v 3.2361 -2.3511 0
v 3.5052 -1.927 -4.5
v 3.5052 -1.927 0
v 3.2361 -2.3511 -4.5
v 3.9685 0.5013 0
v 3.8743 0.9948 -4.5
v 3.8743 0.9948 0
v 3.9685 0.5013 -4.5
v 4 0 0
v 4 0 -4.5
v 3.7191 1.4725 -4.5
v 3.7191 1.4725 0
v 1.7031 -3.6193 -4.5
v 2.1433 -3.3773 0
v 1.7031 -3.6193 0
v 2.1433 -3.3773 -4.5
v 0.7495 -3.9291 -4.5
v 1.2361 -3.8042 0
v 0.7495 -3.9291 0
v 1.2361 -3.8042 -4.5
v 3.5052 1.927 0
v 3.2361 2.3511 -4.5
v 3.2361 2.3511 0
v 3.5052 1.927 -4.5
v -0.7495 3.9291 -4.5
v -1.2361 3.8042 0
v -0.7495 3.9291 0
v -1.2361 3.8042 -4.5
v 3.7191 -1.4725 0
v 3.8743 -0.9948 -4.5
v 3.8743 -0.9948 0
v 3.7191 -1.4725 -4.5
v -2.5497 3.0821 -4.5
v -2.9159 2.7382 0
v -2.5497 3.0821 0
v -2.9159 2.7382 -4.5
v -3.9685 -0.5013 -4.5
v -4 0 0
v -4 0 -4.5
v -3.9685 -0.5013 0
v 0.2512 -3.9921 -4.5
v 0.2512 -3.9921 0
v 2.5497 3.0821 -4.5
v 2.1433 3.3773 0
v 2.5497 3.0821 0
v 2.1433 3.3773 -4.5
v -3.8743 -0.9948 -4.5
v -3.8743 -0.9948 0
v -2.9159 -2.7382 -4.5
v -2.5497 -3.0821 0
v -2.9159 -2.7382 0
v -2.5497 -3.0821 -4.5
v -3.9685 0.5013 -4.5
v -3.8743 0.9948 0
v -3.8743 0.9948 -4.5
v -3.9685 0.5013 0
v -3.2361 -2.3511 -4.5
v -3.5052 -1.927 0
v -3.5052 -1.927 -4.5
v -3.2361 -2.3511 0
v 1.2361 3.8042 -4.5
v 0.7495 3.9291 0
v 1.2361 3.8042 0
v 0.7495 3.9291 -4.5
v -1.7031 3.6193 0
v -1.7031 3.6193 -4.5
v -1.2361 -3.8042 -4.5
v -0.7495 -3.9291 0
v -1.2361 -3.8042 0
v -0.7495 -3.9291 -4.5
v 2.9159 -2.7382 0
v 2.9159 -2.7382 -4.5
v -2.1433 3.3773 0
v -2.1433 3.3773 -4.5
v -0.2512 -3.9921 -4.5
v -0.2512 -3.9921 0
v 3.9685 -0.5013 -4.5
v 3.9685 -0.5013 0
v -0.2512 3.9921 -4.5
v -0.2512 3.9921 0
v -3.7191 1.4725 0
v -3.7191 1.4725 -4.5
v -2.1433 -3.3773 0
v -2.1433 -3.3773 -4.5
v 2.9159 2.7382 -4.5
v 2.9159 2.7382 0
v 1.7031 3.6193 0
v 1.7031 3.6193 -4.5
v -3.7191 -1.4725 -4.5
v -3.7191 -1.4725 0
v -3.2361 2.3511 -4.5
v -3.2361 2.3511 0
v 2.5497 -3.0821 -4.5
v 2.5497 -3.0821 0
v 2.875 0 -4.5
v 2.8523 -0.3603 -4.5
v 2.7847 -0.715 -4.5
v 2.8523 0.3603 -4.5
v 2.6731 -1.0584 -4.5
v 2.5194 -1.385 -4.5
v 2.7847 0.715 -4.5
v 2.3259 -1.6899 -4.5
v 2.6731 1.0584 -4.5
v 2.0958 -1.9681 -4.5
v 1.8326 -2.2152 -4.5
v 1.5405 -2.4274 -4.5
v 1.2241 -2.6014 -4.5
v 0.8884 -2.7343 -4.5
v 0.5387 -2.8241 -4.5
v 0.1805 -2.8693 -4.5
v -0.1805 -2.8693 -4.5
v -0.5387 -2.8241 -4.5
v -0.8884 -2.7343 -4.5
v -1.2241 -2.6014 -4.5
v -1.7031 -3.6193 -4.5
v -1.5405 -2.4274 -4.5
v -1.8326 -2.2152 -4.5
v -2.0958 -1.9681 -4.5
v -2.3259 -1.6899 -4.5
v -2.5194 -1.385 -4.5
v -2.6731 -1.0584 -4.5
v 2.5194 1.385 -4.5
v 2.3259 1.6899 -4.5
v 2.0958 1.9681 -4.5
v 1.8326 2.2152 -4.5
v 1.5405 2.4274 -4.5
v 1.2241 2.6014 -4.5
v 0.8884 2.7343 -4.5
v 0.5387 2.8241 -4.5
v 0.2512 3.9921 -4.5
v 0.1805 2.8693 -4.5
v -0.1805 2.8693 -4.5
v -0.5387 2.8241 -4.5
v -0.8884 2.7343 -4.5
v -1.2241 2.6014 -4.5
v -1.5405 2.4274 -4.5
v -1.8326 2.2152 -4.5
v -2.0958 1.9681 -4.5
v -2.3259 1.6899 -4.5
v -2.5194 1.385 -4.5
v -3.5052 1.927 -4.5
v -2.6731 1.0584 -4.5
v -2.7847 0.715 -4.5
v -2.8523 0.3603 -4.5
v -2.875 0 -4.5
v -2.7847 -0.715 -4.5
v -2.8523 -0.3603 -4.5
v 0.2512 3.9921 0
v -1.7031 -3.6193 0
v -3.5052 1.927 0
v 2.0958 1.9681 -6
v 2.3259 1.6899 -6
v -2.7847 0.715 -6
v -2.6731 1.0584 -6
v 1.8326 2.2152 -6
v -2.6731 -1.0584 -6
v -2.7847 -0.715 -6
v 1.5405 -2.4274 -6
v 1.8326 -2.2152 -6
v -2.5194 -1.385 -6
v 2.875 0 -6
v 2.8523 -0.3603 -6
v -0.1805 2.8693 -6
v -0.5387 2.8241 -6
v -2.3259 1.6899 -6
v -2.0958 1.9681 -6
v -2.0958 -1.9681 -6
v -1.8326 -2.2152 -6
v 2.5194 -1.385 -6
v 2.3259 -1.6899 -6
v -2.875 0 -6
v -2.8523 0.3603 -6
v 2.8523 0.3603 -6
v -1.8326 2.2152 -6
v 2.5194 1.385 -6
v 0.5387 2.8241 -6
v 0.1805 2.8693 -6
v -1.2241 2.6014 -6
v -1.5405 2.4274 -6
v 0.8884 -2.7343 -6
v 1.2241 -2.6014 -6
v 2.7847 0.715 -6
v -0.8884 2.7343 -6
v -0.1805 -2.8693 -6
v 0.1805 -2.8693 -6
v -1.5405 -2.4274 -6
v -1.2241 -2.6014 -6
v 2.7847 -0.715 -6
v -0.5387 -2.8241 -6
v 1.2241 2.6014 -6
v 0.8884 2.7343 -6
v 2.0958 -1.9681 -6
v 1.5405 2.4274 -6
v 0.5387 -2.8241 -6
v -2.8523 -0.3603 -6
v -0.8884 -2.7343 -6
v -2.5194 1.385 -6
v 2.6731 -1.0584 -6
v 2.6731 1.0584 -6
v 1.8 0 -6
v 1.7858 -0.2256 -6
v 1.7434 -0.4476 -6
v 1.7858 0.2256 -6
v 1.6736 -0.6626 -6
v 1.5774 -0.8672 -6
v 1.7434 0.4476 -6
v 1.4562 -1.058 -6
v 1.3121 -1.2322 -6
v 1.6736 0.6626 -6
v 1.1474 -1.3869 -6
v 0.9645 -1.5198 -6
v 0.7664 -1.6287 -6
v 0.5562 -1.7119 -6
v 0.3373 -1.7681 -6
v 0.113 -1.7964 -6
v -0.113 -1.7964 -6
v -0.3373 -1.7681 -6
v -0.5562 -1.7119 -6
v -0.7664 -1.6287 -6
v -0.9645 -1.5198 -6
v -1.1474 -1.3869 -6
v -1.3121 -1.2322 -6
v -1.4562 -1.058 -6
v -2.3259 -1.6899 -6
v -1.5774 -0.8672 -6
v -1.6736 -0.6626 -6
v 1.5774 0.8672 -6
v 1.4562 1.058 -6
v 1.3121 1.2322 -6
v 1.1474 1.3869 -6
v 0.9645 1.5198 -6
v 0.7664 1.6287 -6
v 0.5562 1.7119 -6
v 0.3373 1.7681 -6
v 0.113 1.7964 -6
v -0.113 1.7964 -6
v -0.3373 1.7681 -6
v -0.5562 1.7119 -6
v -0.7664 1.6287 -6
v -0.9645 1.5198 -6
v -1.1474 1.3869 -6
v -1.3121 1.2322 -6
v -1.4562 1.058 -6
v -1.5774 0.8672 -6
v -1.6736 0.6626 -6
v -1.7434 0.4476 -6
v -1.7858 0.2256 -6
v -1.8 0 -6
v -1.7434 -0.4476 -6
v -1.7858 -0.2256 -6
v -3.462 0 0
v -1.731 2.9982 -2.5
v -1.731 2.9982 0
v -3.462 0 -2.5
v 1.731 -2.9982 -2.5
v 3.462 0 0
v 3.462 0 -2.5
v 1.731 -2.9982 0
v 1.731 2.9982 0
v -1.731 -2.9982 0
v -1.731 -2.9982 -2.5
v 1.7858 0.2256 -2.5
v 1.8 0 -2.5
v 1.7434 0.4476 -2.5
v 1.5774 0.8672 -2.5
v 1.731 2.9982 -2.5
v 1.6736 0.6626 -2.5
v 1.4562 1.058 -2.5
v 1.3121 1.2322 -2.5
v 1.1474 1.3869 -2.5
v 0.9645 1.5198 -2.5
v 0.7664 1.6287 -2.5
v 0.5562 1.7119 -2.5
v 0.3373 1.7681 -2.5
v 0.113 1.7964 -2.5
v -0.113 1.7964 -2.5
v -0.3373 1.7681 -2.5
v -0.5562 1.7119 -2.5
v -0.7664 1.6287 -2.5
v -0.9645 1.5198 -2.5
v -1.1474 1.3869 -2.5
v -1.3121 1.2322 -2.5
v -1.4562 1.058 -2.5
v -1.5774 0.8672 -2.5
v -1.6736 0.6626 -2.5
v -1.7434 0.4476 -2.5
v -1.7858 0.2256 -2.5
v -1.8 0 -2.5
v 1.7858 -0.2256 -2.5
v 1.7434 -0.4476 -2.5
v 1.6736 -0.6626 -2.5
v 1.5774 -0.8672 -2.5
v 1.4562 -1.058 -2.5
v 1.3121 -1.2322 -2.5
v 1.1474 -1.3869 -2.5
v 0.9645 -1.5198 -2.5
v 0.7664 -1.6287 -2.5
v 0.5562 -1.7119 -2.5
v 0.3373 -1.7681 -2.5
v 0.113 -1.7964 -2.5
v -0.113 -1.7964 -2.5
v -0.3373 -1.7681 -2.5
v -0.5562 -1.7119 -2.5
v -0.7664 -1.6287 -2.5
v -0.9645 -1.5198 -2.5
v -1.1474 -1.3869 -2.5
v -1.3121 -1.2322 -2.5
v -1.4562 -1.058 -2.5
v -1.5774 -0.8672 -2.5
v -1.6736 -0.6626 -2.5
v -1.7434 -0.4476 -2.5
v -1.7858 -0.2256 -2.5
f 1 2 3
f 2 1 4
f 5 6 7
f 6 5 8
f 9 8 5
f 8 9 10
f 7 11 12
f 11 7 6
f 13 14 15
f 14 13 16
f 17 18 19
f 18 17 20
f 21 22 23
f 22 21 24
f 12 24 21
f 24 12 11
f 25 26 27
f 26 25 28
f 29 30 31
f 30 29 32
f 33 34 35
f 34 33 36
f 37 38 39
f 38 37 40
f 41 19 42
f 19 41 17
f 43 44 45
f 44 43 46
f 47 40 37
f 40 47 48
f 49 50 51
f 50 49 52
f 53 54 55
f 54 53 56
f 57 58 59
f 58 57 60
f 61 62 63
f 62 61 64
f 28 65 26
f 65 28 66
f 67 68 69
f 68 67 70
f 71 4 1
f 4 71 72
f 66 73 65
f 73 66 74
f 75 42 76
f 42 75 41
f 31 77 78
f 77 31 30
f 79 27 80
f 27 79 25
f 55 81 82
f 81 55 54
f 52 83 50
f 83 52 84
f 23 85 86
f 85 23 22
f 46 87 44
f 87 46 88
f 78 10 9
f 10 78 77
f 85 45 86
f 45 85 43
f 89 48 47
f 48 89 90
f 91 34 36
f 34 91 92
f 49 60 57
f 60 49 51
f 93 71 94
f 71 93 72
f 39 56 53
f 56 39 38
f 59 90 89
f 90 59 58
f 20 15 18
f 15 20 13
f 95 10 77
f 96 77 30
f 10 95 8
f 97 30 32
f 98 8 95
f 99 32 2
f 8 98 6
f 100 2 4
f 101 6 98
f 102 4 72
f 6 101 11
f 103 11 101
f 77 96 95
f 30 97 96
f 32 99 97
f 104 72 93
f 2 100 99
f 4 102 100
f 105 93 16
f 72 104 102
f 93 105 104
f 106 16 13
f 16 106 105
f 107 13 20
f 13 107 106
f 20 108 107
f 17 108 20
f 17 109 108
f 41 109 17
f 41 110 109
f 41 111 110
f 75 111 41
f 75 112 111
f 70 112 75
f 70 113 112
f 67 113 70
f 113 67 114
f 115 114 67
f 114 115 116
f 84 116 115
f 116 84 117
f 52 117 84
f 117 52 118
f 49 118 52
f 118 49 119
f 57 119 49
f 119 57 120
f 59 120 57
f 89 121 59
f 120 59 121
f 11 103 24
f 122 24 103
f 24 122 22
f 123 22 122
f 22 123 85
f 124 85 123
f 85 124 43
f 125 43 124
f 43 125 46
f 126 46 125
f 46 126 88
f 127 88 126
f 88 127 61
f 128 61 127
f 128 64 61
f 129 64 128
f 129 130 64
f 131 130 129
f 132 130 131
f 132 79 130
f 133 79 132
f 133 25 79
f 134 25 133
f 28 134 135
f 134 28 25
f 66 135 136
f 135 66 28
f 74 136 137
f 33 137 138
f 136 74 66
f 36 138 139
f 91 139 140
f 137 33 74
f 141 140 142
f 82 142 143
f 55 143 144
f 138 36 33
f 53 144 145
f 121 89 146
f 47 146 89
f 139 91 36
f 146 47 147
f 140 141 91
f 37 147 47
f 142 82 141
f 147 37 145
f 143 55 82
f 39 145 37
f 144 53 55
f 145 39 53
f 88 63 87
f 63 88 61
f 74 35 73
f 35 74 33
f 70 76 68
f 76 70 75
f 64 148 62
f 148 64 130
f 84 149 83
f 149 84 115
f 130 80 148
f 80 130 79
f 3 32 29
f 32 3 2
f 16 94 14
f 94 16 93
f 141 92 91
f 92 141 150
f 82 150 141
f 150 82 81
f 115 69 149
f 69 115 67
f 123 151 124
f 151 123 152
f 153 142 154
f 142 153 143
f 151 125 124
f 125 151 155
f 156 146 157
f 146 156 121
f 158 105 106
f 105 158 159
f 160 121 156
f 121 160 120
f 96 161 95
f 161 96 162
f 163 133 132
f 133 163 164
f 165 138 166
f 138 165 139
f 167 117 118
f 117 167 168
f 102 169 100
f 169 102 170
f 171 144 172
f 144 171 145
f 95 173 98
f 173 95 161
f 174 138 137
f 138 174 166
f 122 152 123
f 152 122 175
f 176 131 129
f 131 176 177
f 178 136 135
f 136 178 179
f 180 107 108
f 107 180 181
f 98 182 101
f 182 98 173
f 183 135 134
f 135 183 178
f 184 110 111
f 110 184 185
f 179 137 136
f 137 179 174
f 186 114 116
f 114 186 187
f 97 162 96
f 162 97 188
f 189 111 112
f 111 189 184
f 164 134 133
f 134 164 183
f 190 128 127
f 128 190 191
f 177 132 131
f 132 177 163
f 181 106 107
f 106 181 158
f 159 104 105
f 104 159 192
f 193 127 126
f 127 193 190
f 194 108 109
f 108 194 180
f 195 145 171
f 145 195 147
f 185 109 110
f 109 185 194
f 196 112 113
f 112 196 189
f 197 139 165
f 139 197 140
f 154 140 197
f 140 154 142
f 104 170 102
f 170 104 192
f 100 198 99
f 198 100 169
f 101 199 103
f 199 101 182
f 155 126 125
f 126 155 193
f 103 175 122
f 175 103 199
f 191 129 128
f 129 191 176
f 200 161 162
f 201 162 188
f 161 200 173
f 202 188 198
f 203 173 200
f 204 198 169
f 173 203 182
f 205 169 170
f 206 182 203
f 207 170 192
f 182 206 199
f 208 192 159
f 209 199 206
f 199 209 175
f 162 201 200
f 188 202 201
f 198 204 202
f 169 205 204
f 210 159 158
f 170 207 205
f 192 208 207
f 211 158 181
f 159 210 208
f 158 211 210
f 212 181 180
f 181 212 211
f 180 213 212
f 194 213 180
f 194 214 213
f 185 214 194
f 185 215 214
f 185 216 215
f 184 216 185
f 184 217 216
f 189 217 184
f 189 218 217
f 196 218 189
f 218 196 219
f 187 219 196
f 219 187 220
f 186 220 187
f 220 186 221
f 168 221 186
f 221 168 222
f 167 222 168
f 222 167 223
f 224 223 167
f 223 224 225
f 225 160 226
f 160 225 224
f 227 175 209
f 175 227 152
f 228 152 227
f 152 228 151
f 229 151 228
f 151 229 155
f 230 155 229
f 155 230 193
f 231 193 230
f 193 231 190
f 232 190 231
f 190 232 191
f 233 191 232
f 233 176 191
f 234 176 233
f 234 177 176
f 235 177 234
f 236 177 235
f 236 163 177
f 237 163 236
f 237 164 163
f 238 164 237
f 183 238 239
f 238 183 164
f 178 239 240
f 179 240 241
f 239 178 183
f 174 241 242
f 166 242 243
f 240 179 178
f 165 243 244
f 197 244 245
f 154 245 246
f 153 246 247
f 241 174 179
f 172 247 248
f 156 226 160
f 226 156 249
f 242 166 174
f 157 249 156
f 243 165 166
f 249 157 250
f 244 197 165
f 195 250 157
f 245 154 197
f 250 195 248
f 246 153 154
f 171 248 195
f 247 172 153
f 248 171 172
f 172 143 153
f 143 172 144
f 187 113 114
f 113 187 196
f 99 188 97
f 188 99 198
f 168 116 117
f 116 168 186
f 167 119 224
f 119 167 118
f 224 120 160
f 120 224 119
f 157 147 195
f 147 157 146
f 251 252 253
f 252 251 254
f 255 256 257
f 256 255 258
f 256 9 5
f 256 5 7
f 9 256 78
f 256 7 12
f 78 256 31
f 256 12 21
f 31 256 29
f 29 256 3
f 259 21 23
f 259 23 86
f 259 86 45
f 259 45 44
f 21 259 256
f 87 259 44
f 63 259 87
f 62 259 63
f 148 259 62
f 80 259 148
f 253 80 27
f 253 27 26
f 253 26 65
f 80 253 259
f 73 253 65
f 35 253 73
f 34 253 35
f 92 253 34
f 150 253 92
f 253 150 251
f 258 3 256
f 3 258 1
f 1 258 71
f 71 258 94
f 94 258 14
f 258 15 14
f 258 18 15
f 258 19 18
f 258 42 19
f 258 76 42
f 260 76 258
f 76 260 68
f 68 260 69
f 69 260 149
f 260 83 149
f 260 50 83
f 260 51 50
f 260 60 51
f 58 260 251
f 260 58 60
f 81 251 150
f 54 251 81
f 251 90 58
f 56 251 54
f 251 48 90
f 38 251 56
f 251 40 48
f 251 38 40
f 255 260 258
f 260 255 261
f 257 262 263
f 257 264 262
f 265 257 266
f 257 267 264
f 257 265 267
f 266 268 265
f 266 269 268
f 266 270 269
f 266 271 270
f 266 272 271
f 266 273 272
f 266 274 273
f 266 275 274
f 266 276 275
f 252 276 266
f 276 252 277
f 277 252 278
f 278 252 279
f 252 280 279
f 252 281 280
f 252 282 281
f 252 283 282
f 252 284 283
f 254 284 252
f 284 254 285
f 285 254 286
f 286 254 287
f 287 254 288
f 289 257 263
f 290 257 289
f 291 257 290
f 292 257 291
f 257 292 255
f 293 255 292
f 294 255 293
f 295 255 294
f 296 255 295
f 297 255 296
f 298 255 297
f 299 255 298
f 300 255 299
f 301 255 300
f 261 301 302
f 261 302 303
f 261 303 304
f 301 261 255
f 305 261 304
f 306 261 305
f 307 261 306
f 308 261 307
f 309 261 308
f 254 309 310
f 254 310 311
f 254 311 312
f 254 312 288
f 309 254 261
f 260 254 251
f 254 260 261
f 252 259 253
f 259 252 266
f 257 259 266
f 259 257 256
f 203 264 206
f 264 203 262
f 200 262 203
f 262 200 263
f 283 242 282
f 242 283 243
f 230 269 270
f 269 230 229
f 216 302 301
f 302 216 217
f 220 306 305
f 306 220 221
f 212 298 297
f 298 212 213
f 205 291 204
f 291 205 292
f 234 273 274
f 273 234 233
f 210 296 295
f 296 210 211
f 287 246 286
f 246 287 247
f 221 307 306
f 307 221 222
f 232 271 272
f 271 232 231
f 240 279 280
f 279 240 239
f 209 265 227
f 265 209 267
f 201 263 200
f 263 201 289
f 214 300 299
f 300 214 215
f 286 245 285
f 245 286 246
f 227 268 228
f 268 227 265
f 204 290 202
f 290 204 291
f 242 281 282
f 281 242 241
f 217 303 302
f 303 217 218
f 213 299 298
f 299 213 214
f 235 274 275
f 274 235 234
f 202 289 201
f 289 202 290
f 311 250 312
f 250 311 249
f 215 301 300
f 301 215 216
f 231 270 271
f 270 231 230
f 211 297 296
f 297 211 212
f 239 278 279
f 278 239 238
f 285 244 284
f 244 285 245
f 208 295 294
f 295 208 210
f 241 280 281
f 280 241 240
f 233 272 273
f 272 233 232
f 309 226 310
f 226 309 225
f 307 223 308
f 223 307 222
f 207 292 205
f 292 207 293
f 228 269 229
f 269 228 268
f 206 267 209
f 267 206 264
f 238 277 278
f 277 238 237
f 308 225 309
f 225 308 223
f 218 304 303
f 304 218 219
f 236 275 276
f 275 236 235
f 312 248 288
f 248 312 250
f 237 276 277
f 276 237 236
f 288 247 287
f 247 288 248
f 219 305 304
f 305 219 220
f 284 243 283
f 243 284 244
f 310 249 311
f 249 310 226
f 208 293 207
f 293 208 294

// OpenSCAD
$fn = 50;

difference() {
	union() {
		translate(v = [0, 0, -4.5]) {
			cylinder(h = 7.5, r = 4.0);
		}
		#translate(v = [0, 0, -6.0]) {
			cylinder(h = 6, r = 2.875);
		}
	}
	union() {
		translate(v = [0, 0, 0]) {
			rotate(a = [0, 0, 0]) {
				difference() {
					union() {
						translate(v = [0, 0, -2.5]) {
							linear_extrude(height = 2.5) {
								polygon(points = [[3.4619999999999997, 0.0], [1.7310000000000003, 2.9981799479017264], [-1.7309999999999992, 2.9981799479017264], [-3.4619999999999997, 4.2397272186481365e-16], [-1.7310000000000014, -2.998179947901726], [1.7309999999999977, -2.9981799479017277]]);
							}
						}
					}
					union();
				}
			}
		}
		#cylinder(h = 3, r = 5.0);
		#translate(v = [0, 0, -100.0]) {
			cylinder(h = 200, r = 1.8);
		}
	}
}
